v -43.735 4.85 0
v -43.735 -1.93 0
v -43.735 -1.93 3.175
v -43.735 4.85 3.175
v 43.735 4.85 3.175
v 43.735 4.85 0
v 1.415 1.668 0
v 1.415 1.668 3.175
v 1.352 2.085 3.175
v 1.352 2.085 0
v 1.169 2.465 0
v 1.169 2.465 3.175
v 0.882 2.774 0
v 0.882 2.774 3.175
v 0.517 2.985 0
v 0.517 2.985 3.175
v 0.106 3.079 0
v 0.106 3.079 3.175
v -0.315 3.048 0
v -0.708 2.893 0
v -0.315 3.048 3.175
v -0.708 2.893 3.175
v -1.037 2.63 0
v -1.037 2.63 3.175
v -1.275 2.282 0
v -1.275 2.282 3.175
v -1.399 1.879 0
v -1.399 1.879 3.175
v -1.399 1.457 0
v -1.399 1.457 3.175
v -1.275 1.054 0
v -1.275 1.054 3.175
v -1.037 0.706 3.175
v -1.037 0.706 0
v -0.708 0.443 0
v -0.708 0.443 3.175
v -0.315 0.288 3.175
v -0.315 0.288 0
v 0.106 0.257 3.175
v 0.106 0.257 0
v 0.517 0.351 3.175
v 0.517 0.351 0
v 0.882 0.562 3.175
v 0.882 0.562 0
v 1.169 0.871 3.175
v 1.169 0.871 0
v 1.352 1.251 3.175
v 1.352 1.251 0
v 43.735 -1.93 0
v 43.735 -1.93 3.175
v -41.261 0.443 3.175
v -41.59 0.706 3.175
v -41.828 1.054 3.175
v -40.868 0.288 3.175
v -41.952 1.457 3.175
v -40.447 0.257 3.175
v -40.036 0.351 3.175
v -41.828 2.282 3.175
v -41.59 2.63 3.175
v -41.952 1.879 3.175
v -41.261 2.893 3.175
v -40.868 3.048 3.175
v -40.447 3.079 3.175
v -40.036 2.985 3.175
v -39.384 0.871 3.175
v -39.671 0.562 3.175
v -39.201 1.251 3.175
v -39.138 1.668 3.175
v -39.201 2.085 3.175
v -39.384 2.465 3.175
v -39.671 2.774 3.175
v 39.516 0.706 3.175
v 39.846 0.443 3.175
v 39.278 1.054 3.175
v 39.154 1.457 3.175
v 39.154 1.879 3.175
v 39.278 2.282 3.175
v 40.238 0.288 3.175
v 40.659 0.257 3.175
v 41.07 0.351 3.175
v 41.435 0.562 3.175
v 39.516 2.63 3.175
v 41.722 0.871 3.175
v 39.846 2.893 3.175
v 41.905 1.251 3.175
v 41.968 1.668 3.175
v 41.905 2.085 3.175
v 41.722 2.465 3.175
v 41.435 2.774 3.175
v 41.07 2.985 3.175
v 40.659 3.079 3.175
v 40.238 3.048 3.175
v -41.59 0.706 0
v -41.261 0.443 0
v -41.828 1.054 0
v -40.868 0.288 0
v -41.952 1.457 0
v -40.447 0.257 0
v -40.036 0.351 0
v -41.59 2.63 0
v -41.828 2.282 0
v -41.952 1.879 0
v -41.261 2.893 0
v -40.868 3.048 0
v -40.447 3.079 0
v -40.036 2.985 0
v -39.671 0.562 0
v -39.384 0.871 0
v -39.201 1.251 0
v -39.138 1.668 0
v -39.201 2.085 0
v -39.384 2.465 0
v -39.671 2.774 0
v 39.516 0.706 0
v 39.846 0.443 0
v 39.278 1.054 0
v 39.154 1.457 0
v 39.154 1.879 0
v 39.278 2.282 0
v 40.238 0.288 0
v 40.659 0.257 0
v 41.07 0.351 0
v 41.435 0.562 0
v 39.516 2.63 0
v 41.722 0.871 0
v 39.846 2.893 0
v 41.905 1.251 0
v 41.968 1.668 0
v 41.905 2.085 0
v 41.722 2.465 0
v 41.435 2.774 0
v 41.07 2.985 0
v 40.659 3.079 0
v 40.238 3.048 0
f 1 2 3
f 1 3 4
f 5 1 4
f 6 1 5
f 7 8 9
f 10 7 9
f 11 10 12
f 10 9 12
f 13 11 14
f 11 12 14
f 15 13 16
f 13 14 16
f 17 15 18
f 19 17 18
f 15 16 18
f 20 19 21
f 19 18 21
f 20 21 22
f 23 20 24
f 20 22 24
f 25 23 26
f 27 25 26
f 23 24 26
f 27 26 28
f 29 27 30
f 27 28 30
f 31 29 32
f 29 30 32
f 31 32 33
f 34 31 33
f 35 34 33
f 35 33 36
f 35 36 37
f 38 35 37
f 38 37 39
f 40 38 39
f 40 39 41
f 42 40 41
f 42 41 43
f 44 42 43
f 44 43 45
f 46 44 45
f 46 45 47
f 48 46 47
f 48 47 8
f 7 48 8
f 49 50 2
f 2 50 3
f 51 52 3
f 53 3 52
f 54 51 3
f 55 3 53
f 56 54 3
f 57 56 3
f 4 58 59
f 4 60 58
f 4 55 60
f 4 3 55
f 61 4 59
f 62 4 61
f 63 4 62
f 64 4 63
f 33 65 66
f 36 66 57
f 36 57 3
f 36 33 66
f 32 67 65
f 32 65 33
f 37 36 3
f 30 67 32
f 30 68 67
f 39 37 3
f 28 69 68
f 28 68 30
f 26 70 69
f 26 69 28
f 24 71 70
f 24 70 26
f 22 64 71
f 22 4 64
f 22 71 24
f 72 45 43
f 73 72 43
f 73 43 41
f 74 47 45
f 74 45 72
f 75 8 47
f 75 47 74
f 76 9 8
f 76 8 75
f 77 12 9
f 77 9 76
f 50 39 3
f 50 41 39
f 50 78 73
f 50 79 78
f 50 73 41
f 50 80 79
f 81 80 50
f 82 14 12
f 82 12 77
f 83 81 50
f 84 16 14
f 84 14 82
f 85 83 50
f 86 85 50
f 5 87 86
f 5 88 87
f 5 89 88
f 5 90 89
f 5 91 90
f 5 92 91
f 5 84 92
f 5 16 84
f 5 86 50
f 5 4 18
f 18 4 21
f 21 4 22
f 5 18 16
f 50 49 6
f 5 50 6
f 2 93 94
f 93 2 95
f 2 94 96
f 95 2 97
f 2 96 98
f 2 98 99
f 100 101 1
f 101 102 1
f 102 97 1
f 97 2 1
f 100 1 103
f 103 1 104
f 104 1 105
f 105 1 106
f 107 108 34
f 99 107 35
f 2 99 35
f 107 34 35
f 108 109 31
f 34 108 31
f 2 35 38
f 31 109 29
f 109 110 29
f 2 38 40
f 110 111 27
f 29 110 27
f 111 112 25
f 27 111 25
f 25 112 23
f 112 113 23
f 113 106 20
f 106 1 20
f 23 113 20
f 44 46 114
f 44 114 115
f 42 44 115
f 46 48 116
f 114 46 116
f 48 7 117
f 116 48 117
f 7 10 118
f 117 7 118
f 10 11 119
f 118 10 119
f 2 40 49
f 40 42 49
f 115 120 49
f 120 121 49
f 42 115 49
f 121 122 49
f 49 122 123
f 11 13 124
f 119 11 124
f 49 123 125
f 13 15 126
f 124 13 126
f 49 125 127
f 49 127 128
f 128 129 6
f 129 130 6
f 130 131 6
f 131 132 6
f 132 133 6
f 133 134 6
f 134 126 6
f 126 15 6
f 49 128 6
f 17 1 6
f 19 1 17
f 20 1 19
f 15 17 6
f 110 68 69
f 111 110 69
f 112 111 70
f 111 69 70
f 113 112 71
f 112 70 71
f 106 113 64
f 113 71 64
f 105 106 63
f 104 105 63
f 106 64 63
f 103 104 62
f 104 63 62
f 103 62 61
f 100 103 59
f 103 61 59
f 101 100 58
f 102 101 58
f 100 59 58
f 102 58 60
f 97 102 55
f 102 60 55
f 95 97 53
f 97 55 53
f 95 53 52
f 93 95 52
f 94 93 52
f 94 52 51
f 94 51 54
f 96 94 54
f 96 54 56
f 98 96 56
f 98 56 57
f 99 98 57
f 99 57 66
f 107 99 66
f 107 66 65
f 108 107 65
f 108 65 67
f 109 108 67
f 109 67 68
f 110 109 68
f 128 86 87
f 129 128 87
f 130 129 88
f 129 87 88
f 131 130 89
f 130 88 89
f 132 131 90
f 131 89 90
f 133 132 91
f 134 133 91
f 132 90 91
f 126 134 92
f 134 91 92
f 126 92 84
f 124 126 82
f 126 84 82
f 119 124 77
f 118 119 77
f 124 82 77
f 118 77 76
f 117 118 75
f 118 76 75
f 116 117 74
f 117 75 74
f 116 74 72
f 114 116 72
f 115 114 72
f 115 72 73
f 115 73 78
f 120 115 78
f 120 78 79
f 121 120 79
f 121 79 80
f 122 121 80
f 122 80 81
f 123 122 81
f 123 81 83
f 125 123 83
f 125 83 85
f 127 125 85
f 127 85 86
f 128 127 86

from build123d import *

# Parameters (mm, degrees)
SKETCH1_W           = 87.47
SKETCH1_H           = 9.7
BOSS_EXTRUDE1_DEPTH = 3.175
SKETCH3_R           = 1.415
CUT_EXTRUDE1_DEPTH  = 10
CUT_EXTRUDE2_DEPTH  = 10


with BuildPart() as part:
    # Sketch1 → Boss-Extrude1 (new body)
    with BuildSketch(Plane.XY):
        Rectangle(SKETCH1_W, SKETCH1_H)
    extrude(amount=BOSS_EXTRUDE1_DEPTH)

    # Sketch3 → Cut-Extrude1 (cut)
    with BuildSketch(Plane.XY.offset(3.175)):
        with Locations((-40.553019485, 1.668019485)):
            Circle(SKETCH3_R)
        with Locations((0, 1.668019485)):
            Circle(SKETCH3_R)
        with Locations((40.553019485, 1.668019485)):
            Circle(SKETCH3_R)
    extrude(amount=-CUT_EXTRUDE1_DEPTH, mode=Mode.SUBTRACT)

    # Sketch4 → Cut-Extrude2 (cut)
    with BuildSketch(Plane.XY.offset(3.175)):
        Polygon((0, -1.93), (-43.735, -1.93), (-43.735, -4.85), (43.735, -4.85), (43.735, -1.93), align=None)
    extrude(amount=-CUT_EXTRUDE2_DEPTH, mode=Mode.SUBTRACT)


solid = part.part
